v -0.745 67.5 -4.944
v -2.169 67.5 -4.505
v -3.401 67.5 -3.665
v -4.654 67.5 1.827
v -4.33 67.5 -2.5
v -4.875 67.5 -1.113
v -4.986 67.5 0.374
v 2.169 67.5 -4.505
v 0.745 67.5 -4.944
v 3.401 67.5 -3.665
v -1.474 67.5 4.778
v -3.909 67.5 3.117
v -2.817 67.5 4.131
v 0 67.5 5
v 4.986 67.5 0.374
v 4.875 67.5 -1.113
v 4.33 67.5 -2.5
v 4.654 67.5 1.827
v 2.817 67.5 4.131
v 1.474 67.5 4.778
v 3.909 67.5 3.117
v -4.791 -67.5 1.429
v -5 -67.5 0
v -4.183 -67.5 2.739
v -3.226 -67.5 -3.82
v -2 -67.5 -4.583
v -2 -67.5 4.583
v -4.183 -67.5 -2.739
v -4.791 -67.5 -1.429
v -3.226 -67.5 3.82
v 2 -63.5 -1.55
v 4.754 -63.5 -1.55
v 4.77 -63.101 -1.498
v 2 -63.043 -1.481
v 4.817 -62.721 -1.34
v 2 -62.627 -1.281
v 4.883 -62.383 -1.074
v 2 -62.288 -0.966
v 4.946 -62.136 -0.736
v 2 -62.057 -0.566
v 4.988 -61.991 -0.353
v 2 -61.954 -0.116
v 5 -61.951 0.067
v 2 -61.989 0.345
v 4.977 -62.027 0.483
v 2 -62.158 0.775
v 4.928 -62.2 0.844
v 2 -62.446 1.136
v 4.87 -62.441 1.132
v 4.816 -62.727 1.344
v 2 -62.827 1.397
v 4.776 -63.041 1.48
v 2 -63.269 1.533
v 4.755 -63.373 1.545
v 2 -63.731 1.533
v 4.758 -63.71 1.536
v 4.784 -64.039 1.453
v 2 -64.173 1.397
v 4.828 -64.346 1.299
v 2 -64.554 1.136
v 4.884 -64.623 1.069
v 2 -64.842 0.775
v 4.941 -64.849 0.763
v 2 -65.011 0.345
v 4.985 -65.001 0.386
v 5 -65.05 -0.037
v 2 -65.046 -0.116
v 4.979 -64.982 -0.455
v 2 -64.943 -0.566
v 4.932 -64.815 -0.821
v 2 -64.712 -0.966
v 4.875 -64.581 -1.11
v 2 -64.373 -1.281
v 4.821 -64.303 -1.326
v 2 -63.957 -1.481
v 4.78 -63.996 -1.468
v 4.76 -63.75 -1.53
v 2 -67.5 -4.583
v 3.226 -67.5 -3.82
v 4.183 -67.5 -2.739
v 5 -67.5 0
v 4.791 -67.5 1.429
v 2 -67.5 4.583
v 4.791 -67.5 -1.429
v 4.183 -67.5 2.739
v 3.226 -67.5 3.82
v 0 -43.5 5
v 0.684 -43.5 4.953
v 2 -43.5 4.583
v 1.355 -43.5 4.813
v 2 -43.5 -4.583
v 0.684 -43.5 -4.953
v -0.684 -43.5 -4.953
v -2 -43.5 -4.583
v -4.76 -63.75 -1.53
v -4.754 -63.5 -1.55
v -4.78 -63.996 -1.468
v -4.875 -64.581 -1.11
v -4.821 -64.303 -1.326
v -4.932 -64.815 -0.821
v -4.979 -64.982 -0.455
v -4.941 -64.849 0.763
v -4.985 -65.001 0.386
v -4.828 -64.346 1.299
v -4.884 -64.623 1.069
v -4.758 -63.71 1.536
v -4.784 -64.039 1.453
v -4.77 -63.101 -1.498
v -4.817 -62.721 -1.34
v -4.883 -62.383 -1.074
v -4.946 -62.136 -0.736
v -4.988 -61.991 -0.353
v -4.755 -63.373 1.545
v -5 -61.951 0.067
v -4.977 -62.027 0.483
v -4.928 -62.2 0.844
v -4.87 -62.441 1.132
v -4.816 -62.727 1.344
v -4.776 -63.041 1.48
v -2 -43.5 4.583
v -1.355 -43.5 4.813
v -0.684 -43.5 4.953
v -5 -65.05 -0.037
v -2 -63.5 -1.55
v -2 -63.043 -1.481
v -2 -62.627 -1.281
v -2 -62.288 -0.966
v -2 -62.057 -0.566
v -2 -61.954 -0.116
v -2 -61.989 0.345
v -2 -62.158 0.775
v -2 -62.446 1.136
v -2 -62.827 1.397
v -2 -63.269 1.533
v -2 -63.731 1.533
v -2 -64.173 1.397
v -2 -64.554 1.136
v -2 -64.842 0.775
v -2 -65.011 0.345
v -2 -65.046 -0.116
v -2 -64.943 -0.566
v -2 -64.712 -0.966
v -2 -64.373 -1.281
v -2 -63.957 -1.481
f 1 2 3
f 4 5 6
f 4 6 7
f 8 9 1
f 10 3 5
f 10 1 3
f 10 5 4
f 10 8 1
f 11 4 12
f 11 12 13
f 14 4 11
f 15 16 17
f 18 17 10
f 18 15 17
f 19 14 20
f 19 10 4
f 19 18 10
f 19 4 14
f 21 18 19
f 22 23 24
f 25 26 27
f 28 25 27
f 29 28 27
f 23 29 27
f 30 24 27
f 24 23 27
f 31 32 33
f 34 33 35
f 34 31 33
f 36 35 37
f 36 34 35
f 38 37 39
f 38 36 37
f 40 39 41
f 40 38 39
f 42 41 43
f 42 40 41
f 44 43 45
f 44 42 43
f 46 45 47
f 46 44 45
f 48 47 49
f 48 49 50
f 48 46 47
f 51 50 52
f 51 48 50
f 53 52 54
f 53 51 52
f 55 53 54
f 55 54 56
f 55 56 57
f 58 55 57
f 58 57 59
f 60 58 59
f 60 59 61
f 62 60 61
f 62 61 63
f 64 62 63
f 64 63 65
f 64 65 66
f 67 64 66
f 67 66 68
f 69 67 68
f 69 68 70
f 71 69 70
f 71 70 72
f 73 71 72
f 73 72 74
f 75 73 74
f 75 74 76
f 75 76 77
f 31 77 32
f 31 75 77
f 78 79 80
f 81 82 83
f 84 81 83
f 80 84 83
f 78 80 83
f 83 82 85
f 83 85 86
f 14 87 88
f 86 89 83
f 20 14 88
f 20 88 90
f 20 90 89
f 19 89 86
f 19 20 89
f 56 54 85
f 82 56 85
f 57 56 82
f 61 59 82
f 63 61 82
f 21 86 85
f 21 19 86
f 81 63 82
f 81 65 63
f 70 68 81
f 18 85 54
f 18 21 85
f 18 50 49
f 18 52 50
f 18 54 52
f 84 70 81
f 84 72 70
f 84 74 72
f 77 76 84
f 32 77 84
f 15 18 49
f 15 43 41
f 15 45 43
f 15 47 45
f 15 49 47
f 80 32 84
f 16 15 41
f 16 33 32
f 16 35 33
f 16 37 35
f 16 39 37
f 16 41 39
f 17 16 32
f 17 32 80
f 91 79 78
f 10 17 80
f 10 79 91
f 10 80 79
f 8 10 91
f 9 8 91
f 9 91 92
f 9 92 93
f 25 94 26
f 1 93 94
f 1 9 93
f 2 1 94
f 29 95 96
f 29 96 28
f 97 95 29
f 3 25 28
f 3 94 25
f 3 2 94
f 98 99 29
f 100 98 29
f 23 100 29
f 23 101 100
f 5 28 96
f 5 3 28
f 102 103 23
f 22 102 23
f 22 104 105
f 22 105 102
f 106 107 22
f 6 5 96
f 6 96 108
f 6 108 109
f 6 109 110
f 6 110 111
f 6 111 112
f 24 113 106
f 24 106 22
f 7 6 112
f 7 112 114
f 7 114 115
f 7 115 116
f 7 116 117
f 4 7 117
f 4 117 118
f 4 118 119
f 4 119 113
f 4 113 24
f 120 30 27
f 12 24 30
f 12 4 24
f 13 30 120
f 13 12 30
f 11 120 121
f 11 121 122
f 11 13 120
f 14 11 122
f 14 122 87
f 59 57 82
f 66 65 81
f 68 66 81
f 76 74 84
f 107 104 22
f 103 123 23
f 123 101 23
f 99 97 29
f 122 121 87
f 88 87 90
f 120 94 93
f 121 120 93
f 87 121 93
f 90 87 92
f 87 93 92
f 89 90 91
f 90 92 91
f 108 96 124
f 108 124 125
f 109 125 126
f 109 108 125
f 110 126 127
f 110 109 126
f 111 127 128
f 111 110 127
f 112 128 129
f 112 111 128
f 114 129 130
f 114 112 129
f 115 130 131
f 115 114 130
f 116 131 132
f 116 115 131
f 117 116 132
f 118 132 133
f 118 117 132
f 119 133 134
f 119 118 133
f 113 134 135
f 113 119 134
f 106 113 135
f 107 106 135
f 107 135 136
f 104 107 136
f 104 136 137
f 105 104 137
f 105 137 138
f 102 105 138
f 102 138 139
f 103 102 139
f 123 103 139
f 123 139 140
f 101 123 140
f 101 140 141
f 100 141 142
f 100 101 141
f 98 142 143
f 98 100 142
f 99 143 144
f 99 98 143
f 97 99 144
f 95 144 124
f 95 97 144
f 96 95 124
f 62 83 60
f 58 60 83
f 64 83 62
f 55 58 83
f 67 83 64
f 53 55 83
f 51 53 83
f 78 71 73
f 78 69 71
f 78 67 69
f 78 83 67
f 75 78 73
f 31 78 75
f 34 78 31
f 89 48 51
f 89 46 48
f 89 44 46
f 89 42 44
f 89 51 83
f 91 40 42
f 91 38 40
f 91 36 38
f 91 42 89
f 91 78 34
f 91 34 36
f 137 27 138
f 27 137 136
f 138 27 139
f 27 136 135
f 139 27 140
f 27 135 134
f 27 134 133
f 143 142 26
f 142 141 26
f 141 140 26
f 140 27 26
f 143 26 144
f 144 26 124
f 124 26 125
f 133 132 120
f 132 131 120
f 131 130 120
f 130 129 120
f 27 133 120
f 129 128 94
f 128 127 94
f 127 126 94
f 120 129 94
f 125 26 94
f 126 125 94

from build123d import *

# Parameters (mm, degrees)
SKETCH1_R               = 5
BOSS_EXTRUDE1_DEPTH     = 67.5
CUT_EXTRUDE1_DEPTH      = 68.869359802
CUT_EXTRUDE1_DEPTH_BACK = 68.869359802
SKETCH2_W               = 4
SKETCH2_H               = 24
CUT_EXTRUDE2_DEPTH      = 68.869359802
CUT_EXTRUDE2_DEPTH_BACK = 68.869359802
SKETCH3_R               = 1.55


with BuildPart() as part:
    # Sketch1 → Boss-Extrude1 (new, symmetric)
    with BuildSketch(Plane(origin=(0, 0, 0), x_dir=(1, 0, 0), z_dir=(0, 1, 0))):
        with Locations(Location((0, 0, 0), (0, 0, 270))):
            Circle(SKETCH1_R)
    extrude(amount=BOSS_EXTRUDE1_DEPTH, both=True)

    # Sketch2 → Cut-Extrude1 (cut, two sides: drawn at the far end of the back side and taken through both)
    with BuildSketch(Plane.XY.offset(-CUT_EXTRUDE1_DEPTH_BACK)):
        with Locations((0, -55.5)):
            Rectangle(SKETCH2_W, SKETCH2_H)
    extrude(amount=CUT_EXTRUDE1_DEPTH + CUT_EXTRUDE1_DEPTH_BACK, mode=Mode.SUBTRACT)

    # Sketch3 → Cut-Extrude2 (cut, two sides: drawn at the far end of the back side and taken through both)
    with BuildSketch(Plane(origin=(0, 0, 0), x_dir=(0, 0, -1), z_dir=(1, 0, 0)).offset(-CUT_EXTRUDE2_DEPTH_BACK)):
        with Locations((0, -63.5)):
            Circle(SKETCH3_R)
    extrude(amount=CUT_EXTRUDE2_DEPTH + CUT_EXTRUDE2_DEPTH_BACK, mode=Mode.SUBTRACT)


solid = part.part
